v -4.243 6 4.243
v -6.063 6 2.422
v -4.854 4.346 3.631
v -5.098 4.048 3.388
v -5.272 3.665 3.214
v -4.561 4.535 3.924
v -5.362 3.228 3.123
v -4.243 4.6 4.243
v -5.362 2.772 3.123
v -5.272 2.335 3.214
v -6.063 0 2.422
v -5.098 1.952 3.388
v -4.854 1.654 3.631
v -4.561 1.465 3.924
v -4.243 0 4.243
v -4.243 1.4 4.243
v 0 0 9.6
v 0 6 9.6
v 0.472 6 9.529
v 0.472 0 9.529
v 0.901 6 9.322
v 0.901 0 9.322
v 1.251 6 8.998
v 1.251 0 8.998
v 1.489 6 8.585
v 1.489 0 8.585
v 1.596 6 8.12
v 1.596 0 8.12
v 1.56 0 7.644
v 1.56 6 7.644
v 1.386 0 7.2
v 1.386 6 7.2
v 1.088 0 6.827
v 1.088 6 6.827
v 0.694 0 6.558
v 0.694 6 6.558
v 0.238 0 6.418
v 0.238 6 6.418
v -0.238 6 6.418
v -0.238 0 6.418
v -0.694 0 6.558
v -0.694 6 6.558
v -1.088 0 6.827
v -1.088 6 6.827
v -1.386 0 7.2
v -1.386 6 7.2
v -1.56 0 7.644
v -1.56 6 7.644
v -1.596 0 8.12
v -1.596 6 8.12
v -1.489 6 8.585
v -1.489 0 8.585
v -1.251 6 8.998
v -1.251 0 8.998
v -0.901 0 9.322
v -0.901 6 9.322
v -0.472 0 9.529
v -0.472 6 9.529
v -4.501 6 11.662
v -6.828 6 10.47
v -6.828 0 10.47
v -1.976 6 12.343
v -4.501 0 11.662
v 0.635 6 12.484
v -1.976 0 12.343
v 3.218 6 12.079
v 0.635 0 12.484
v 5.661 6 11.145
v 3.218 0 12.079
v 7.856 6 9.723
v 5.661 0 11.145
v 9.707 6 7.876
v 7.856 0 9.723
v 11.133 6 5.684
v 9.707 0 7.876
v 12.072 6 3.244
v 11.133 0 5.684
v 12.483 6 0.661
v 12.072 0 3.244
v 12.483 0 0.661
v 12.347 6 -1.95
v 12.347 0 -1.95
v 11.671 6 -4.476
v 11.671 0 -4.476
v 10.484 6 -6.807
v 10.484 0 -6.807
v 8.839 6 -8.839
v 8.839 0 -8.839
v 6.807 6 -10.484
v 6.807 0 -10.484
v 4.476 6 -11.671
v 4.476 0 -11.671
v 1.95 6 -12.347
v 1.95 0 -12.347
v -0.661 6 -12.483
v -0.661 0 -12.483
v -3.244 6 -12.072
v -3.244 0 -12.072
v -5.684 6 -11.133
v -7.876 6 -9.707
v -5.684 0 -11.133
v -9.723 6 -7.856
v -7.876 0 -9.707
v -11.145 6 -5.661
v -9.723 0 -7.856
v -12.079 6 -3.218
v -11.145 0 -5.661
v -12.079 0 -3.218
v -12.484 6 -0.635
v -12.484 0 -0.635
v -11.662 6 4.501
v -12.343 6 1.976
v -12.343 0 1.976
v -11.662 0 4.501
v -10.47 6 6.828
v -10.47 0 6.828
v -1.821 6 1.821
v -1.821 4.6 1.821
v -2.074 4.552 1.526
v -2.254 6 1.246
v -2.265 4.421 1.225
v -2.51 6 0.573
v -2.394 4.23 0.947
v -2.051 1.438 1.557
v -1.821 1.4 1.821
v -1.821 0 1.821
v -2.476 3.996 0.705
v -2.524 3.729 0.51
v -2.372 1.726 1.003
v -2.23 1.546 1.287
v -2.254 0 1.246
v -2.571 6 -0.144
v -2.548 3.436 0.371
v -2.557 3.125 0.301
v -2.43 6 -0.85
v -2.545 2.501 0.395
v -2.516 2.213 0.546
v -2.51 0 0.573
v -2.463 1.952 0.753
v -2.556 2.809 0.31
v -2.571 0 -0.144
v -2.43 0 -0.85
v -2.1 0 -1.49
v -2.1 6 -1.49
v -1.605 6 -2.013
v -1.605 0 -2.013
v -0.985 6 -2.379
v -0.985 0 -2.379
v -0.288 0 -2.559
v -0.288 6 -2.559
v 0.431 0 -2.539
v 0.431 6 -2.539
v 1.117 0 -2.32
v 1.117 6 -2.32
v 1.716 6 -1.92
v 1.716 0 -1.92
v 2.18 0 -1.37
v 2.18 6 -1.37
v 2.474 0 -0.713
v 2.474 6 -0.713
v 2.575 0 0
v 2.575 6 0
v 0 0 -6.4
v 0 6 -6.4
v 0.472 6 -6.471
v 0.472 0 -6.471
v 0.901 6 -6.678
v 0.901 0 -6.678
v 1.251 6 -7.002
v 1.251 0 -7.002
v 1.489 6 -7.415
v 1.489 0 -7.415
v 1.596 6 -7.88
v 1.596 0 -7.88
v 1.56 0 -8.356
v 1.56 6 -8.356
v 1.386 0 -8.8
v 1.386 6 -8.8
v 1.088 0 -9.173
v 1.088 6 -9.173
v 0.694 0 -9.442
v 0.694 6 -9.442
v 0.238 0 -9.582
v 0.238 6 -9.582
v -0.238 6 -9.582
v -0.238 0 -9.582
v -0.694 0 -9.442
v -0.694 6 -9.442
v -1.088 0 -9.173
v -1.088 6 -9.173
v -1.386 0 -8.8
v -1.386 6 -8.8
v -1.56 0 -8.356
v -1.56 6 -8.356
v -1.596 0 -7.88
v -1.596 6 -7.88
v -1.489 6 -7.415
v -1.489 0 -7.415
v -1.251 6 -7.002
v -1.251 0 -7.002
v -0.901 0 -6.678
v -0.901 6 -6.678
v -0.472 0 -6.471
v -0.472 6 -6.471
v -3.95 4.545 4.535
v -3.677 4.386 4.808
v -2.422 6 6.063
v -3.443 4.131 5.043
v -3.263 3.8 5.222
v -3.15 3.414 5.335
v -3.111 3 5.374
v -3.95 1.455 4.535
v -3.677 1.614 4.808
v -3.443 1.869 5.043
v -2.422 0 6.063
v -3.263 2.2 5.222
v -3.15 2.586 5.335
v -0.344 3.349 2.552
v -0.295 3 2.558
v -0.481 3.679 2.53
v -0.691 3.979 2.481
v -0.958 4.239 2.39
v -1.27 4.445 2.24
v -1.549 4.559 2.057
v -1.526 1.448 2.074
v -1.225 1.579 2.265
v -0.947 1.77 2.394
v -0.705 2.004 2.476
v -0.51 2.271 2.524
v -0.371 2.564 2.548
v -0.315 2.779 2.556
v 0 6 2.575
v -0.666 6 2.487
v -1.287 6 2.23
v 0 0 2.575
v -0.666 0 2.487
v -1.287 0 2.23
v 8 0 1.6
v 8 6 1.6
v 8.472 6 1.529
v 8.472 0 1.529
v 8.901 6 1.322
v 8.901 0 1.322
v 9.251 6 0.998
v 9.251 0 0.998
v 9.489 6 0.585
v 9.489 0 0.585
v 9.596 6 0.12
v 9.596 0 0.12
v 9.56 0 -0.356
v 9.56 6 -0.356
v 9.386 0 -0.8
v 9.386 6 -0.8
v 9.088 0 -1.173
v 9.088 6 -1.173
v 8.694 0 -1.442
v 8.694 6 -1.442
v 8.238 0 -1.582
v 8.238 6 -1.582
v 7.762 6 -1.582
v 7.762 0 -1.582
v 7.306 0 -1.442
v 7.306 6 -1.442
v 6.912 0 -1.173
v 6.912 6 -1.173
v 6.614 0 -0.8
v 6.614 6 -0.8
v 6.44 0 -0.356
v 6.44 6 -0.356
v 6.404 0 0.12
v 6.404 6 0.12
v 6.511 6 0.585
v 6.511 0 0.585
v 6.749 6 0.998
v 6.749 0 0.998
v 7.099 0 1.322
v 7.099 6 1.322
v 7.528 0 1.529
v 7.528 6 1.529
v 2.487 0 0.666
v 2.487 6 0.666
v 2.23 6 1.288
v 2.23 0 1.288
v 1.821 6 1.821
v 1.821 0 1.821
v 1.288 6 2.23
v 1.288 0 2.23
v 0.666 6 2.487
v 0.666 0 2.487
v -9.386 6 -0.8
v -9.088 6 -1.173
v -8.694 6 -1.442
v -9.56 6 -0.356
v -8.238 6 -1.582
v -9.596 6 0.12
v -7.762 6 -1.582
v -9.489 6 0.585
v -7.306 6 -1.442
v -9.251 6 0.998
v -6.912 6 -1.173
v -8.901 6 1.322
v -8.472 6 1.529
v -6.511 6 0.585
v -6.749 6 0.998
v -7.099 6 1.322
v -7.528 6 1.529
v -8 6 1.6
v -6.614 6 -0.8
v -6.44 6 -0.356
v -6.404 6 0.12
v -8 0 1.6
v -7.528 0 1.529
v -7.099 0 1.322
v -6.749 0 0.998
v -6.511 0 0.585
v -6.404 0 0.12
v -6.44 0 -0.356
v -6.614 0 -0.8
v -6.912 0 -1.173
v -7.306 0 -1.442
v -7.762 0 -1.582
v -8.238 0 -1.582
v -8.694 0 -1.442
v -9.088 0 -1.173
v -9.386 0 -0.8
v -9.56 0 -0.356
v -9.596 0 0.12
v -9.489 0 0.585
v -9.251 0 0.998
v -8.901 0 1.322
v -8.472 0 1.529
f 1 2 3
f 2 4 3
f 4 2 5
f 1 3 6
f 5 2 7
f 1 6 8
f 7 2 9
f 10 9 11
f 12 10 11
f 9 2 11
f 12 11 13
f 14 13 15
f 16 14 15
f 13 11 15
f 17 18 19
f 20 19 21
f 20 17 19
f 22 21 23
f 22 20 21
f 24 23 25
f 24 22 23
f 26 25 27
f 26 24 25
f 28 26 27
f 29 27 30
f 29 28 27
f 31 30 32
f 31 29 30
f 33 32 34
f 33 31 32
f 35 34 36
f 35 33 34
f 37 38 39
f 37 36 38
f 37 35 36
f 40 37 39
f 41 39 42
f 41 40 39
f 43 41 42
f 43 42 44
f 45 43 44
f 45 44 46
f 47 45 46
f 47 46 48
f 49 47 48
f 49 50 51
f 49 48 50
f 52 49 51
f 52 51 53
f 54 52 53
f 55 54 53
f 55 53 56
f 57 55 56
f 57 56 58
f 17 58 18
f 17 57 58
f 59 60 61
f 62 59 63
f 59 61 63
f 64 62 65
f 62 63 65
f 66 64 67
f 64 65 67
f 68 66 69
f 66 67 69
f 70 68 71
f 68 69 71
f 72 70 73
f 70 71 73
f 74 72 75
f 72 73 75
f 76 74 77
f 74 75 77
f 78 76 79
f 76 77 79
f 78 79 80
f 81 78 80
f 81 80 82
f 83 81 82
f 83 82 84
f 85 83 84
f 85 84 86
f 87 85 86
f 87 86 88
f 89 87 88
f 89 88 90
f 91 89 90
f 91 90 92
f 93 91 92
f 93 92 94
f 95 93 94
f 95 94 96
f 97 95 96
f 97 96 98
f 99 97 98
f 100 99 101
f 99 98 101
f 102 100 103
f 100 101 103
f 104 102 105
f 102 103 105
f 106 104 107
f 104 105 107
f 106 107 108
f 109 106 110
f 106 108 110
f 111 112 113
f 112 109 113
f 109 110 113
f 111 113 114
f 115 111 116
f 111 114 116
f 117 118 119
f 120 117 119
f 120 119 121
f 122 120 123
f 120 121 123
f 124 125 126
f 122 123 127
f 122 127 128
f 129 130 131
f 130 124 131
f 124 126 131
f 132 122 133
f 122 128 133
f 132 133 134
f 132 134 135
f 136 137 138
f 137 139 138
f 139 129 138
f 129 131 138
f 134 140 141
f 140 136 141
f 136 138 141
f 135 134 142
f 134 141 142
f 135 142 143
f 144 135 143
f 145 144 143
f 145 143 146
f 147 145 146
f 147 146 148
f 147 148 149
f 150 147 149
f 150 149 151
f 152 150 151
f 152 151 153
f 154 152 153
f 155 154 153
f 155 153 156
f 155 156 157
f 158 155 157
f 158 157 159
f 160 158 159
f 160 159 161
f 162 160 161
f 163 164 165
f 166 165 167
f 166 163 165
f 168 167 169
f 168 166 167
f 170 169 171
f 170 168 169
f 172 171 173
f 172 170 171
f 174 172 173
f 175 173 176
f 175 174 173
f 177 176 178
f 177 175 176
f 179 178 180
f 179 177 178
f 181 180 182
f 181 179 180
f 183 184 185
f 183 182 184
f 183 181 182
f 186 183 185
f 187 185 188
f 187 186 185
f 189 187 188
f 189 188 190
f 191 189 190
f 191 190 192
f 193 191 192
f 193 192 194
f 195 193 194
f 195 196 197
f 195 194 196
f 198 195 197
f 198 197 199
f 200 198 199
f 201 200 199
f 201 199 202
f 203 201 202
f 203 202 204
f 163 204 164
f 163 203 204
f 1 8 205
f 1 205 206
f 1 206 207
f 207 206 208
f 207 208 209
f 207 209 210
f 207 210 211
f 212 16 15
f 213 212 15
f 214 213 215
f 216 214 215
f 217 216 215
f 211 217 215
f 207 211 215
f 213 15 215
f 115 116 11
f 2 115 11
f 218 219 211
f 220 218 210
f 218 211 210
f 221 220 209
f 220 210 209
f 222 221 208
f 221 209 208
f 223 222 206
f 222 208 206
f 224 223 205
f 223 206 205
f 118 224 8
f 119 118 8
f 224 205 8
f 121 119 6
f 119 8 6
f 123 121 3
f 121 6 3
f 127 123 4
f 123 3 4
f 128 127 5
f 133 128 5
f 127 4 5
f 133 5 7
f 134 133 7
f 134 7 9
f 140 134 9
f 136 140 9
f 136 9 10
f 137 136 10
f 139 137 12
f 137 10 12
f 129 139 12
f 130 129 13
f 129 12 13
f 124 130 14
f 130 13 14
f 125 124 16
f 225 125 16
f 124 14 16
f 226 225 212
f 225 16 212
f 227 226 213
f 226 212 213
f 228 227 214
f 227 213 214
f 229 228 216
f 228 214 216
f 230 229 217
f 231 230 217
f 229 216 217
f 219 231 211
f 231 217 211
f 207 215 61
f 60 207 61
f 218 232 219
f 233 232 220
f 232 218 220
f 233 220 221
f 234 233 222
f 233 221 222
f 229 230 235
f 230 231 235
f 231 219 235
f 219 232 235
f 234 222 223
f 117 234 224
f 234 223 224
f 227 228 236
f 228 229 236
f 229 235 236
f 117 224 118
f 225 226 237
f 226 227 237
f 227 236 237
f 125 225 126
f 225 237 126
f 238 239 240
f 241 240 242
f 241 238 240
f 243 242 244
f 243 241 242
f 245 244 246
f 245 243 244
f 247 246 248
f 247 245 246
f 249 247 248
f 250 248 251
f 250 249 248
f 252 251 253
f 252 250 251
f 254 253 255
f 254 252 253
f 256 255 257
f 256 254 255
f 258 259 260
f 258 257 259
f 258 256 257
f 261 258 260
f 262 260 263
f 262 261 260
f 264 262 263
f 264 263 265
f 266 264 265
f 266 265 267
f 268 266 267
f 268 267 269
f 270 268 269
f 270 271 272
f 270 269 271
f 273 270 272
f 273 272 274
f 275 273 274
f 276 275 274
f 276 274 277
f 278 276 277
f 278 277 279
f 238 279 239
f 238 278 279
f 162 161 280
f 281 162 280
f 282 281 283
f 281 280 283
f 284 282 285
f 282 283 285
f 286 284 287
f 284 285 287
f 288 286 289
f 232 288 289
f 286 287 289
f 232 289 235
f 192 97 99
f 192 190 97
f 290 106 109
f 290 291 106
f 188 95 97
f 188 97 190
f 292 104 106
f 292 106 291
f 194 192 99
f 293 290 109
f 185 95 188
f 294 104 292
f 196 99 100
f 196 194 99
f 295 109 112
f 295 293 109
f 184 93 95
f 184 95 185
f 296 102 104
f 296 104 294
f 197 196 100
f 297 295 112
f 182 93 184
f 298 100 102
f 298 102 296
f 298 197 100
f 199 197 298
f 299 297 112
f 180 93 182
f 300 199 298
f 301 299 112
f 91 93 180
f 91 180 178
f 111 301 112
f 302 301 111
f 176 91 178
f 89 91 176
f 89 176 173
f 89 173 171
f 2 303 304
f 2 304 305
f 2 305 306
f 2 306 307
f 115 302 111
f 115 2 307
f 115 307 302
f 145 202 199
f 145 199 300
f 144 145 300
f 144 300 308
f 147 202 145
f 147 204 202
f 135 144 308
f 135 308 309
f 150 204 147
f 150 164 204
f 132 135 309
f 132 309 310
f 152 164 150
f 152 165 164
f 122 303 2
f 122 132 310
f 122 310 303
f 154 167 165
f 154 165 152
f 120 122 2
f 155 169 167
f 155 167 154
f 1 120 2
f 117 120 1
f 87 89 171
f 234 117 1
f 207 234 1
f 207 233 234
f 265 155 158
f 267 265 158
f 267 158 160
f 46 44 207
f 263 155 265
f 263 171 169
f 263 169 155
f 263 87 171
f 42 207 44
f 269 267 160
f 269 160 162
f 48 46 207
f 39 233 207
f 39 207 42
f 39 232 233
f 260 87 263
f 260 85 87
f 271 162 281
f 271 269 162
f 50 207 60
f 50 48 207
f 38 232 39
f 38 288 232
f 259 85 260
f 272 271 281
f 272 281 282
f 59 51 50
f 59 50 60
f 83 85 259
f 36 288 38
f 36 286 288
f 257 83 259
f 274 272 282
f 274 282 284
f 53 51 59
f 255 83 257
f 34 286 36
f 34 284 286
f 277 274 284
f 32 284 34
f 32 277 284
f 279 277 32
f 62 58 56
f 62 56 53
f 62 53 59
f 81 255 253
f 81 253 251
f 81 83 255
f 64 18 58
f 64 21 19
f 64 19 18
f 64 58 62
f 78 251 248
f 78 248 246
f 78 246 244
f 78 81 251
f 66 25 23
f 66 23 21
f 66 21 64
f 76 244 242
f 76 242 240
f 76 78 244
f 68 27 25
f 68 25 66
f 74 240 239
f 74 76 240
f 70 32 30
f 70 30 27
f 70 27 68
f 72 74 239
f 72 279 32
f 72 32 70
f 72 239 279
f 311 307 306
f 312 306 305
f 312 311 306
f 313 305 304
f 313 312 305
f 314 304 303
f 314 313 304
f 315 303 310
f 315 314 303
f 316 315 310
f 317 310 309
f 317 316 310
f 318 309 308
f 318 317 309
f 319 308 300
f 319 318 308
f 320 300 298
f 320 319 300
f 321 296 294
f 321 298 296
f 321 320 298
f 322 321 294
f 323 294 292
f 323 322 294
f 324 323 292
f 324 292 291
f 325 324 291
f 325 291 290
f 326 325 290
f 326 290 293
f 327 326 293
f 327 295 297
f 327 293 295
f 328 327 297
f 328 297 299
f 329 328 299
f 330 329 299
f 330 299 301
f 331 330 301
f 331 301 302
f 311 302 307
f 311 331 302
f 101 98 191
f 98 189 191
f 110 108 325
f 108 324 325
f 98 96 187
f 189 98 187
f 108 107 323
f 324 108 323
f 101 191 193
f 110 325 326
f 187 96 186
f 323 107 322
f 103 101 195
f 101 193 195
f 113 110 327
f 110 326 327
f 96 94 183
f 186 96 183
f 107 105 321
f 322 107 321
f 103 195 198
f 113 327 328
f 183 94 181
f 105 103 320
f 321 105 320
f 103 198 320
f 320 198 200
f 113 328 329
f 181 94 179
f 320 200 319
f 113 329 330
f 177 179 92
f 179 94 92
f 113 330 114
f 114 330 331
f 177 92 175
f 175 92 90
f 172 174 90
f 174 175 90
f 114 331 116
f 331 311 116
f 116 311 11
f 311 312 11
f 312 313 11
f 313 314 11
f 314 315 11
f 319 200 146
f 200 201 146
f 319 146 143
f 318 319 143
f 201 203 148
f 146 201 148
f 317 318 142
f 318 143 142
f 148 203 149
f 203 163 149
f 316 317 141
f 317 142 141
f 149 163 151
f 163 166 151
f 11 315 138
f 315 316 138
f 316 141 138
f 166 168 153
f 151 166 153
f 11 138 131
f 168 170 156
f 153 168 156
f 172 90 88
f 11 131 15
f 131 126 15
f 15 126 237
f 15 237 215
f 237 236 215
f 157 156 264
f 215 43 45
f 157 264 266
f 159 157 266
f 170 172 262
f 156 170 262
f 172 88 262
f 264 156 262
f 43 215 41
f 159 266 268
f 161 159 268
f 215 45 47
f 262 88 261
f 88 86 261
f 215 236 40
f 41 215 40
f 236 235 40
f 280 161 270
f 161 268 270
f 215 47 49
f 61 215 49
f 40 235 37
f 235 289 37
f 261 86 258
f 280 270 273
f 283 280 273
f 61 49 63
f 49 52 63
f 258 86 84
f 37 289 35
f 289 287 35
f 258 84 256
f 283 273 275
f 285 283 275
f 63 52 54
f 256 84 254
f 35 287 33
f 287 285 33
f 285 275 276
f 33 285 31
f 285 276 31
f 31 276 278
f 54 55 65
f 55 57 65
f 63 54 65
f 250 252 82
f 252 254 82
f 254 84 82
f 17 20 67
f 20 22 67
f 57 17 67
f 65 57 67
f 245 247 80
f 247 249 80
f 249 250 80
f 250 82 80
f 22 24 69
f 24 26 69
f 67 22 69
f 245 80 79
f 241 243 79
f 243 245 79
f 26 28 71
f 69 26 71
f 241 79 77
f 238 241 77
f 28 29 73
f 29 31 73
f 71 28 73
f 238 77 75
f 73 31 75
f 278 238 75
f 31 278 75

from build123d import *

# Parameters (mm, degrees)
SKETCH_1_R          = 12.5
EXTRUDE_1_DEPTH     = 6
SKETCH_4_R          = 1.6
CUT_EXTRUDE_2_DEPTH = 30
CUT_EXTRUDE_3_DEPTH = 30
SKETCH_6_R          = 1.6
CUT_EXTRUDE_4_DEPTH = 6


with BuildPart() as part:
    # 草图1 → 凸台-拉伸1 (new body)
    with BuildSketch(Plane(origin=(0, 0, 0), x_dir=(1, 0, 0), z_dir=(0, 1, 0))):
        with Locations(Location((0, 0, 0), (0, 0, 270))):
            Circle(SKETCH_1_R)
    extrude(amount=EXTRUDE_1_DEPTH)

    # 草图4 → 切除-拉伸2 (cut)
    with BuildSketch(Plane(origin=(0, 0, 0), x_dir=(1, 0, 0), z_dir=(0, 1, 0))):
        with Locations(Location((0, 8, 0), (0, 0, 270))):
            Circle(SKETCH_4_R)
        with Locations(Location((8, 0, 0), (0, 0, 270))):
            Circle(SKETCH_4_R)
        with Locations(Location((0, -8, 0), (0, 0, 270))):
            Circle(SKETCH_4_R)
        with Locations(Location((-8, 0, 0), (0, 0, 270))):
            Circle(SKETCH_4_R)
    extrude(amount=CUT_EXTRUDE_2_DEPTH, mode=Mode.SUBTRACT)

    # 草图5 → 切除-拉伸3 (cut)
    with BuildSketch(Plane.XZ):
        with BuildLine():
            Line((-4.242640687, 4.242640687), (-8.838834765, 8.838834765))
            ThreePointArc((-8.838834765, 8.838834765), (-9.706634329, 7.875992001), (-10.470059323, 6.8284594))
            Line((-10.470059323, 6.8284594), (-6.063440649, 2.421840726))
            Line((-6.063440649, 2.421840726), (-4.242640687, 4.242640687))
        make_face()
        with BuildLine():
            ThreePointArc((-6.8284594, 10.470059323), (-7.875992001, 9.706634329), (-8.838834765, 8.838834765))
            Line((-8.838834765, 8.838834765), (-4.242640687, 4.242640687))
            Line((-4.242640687, 4.242640687), (-2.421840726, 6.063440649))
            Line((-2.421840726, 6.063440649), (-6.8284594, 10.470059323))
        make_face()
        with BuildLine():
            ThreePointArc((0, 2.575), (-0.985409838, 2.378989796), (-1.820799962, 1.820799962))
            Line((-1.820799962, 1.820799962), (0, 0))
            Line((0, 0), (0, 2.575))
        make_face()
        with BuildLine():
            Line((0, 0), (-1.820799962, 1.820799962))
            ThreePointArc((-1.820799962, 1.820799962), (-0.985409838, -2.378989796), (2.575, 0))
            ThreePointArc((2.575, 0), (1.820799962, 1.820799962), (0, 2.575))
            Line((0, 2.575), (0, 0))
        make_face()
    extrude(amount=-CUT_EXTRUDE_3_DEPTH, mode=Mode.SUBTRACT)

    # 草图6 → 切除-拉伸4 (cut)
    with BuildSketch(Plane(origin=(-4.242640687, 0, 4.242640687), x_dir=(0.7071067811865509, 0, 0.7071067811865442), z_dir=(-0.7071067811865442, 0, 0.7071067811865509))):
        with Locations((0, 3)):
            Circle(SKETCH_6_R)
    extrude(amount=-CUT_EXTRUDE_4_DEPTH, mode=Mode.SUBTRACT)


solid = part.part
